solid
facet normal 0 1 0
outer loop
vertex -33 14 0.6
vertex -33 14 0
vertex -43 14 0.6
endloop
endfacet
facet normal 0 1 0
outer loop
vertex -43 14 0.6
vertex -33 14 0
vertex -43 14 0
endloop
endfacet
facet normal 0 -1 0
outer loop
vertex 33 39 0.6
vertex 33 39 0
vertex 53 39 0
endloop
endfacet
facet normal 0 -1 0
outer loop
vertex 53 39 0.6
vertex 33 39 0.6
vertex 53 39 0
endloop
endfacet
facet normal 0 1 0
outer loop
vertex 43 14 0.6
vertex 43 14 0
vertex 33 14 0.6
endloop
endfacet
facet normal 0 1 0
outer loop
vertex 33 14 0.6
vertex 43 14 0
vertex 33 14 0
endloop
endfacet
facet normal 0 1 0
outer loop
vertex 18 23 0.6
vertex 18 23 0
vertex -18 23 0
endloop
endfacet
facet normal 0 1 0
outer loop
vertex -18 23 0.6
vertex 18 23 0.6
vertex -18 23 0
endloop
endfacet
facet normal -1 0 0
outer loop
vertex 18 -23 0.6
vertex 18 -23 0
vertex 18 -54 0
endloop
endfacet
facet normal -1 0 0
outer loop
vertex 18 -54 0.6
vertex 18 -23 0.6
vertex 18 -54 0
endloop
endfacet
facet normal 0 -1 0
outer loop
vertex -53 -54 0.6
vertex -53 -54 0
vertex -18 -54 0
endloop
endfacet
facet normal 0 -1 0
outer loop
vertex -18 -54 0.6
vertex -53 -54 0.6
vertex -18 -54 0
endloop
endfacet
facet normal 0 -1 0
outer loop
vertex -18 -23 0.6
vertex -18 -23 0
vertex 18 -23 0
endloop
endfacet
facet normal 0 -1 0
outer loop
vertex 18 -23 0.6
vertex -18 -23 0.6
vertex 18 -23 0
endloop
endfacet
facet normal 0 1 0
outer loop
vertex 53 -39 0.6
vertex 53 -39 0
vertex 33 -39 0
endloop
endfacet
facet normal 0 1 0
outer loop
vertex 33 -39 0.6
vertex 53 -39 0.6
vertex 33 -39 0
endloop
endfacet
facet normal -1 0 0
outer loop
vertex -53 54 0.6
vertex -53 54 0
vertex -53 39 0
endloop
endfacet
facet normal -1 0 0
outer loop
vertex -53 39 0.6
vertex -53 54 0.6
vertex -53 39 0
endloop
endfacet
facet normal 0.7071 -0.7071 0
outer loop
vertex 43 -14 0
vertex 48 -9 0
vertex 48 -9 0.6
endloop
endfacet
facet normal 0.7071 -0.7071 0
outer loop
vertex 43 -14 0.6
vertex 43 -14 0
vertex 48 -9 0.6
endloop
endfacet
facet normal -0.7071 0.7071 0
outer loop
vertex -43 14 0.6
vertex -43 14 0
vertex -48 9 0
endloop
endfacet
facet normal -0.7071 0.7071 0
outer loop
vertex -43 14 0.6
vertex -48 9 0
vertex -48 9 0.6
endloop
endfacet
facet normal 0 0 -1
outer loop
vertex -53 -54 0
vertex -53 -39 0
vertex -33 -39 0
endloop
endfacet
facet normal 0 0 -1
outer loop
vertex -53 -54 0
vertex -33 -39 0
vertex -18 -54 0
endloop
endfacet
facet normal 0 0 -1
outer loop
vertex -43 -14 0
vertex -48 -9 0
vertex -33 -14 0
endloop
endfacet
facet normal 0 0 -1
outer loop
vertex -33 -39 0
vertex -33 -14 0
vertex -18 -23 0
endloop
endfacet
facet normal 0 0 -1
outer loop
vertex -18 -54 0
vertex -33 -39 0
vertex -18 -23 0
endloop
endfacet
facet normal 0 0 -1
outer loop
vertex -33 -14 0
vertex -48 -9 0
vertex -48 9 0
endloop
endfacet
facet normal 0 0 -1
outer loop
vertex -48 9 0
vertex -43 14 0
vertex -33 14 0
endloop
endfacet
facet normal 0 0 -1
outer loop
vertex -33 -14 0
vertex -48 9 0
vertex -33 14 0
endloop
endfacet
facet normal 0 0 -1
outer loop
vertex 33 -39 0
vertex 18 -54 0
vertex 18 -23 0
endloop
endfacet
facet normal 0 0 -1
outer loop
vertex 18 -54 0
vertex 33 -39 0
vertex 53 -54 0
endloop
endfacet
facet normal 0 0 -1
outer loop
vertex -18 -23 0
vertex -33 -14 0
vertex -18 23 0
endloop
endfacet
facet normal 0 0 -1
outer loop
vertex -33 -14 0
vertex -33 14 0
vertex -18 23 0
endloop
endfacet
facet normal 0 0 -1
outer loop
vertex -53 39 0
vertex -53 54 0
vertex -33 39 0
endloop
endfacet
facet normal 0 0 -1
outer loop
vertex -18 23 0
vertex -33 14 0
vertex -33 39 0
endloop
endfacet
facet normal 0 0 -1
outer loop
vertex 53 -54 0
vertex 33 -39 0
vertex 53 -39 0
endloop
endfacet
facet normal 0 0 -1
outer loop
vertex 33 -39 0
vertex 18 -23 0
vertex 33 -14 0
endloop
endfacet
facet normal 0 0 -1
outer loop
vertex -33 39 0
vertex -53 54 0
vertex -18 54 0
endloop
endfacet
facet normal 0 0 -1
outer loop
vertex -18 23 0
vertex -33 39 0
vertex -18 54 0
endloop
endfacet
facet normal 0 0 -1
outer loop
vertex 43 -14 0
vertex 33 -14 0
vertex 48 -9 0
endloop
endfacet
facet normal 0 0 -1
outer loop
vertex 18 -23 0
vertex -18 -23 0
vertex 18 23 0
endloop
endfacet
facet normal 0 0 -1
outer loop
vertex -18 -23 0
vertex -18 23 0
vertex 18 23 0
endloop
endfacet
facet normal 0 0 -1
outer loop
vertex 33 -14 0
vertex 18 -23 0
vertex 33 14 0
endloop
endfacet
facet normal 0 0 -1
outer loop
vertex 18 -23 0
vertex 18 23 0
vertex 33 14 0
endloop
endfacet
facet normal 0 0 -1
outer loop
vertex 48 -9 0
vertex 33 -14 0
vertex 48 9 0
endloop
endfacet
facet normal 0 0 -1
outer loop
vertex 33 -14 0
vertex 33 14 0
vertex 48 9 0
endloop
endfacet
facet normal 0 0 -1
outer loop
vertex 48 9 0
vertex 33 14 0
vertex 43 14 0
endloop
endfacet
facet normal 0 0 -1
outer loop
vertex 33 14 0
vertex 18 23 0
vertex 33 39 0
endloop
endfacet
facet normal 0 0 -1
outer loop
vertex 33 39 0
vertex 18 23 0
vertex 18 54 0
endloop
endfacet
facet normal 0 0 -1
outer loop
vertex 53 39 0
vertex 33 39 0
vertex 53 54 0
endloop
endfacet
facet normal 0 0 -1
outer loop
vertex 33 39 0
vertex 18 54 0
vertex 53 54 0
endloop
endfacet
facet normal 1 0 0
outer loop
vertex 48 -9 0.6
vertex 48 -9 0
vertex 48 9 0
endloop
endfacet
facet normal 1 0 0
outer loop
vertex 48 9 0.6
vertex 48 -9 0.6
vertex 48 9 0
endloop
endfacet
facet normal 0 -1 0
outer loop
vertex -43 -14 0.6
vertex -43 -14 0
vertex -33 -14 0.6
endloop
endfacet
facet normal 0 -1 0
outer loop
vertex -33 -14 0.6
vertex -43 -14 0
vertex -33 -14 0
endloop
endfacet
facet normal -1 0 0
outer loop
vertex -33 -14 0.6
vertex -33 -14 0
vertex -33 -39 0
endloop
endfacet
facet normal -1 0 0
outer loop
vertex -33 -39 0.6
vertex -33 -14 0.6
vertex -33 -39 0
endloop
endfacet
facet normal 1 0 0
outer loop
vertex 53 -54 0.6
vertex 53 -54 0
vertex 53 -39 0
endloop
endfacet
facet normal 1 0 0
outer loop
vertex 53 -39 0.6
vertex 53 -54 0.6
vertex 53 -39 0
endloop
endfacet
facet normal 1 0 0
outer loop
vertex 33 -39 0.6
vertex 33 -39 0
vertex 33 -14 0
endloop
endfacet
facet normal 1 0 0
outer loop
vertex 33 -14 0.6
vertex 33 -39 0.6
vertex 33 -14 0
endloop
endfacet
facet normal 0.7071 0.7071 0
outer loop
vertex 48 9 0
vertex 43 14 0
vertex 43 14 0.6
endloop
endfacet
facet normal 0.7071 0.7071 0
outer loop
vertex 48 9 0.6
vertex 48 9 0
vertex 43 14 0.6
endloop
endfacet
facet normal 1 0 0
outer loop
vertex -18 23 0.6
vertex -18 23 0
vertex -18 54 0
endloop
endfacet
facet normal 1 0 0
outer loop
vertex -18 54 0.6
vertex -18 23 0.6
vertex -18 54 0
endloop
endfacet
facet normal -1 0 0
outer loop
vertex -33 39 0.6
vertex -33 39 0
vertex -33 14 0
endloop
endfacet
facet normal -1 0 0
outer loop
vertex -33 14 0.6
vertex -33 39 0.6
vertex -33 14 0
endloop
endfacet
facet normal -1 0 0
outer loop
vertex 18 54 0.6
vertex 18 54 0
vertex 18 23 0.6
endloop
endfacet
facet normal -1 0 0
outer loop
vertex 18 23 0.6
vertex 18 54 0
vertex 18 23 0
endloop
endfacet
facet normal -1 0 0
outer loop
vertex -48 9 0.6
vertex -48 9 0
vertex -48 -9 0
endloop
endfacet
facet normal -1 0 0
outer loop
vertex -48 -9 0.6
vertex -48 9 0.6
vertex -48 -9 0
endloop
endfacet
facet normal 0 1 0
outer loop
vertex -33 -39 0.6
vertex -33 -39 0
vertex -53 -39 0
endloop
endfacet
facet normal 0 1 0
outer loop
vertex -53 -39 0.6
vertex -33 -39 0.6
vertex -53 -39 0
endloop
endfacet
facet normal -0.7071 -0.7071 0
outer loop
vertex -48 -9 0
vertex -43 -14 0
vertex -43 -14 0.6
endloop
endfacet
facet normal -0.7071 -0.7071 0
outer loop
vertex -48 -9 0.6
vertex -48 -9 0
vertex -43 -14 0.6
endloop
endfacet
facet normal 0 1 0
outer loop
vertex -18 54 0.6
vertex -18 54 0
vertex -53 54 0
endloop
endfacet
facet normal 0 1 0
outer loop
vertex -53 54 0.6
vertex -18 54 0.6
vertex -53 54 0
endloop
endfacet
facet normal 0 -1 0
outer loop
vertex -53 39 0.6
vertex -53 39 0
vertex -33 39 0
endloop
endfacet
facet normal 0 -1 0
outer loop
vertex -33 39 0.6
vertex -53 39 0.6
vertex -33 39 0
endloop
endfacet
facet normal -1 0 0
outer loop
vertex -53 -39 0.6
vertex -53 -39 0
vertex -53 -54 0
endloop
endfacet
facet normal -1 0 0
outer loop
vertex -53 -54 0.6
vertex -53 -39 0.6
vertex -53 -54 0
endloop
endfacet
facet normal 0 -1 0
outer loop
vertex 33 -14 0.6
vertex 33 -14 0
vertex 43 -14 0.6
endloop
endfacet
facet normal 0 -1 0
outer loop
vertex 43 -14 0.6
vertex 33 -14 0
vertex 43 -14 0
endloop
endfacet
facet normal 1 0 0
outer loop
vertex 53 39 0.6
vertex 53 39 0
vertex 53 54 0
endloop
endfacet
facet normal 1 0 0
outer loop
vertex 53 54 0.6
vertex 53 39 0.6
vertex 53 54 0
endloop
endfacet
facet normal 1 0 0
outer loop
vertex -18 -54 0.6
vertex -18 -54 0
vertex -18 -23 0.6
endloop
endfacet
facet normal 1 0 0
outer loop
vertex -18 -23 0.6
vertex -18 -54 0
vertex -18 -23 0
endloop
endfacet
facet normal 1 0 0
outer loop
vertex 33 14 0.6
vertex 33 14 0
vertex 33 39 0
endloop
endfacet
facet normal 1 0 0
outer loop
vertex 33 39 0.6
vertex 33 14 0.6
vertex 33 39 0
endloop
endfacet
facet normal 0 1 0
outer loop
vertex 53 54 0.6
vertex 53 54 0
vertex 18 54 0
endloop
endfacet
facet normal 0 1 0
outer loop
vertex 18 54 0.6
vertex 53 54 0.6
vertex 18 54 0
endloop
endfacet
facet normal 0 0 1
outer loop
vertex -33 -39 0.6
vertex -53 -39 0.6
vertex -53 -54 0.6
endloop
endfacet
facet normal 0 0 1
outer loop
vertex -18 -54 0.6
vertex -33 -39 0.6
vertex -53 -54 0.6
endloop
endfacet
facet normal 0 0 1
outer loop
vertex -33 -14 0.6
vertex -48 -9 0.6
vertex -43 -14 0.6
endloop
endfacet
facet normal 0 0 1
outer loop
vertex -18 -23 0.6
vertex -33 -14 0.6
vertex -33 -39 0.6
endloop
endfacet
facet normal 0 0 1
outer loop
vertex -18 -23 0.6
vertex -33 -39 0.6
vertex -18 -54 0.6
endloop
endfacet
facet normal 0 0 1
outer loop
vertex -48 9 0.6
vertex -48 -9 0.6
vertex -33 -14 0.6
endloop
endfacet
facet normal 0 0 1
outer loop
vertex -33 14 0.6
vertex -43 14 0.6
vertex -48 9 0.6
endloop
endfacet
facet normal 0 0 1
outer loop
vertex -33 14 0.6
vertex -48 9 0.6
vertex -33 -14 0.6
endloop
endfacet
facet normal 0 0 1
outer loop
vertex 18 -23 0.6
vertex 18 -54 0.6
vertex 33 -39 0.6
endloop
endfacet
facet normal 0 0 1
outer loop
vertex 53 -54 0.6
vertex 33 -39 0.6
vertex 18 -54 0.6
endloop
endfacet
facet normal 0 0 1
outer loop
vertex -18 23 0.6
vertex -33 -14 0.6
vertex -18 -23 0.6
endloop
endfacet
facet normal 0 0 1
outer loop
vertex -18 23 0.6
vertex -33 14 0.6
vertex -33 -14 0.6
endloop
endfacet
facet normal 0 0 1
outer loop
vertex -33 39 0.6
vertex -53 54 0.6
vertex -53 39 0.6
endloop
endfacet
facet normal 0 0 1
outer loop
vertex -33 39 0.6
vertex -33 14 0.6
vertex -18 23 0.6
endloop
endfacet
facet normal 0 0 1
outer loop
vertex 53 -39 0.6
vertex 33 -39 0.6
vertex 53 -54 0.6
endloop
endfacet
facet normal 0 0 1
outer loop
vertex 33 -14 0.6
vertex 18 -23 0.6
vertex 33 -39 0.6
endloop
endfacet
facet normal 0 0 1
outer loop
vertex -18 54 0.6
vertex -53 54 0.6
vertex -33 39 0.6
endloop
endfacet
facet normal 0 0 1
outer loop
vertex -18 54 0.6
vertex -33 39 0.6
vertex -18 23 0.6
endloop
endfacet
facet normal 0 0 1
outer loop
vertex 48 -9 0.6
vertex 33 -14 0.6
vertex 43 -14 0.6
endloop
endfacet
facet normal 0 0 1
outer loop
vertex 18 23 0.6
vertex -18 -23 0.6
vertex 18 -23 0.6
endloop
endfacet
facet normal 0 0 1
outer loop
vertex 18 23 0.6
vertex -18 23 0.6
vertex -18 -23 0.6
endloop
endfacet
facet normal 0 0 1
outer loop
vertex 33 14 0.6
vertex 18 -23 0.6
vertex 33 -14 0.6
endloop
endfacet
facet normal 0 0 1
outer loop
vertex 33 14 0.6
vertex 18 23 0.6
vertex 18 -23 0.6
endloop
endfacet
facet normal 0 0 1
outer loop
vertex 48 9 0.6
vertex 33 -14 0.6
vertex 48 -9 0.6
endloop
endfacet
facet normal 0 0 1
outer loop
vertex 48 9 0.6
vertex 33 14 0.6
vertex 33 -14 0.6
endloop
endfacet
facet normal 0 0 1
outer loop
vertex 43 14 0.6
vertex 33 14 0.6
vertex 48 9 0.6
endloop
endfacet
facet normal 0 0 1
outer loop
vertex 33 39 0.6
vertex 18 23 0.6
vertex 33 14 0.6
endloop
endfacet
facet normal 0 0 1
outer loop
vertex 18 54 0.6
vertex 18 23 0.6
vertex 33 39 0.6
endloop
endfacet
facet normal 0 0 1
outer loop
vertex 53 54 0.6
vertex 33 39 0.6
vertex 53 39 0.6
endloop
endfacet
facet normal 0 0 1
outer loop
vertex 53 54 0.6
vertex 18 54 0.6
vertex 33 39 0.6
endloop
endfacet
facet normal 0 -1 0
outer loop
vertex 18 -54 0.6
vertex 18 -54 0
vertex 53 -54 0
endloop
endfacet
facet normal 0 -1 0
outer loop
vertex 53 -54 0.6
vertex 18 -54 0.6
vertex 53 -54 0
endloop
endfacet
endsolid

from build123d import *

# Parameters (mm, degrees)
F1_DEPTH = 0.6
F2_SIZE  = 5


with BuildPart() as f1:
    # F0 (on Top) → F1 (new body)
    with BuildSketch(Plane.XY):
        Polygon((-48, 14), (-48, 0), (-48, -14), (-33, -14), (-33, -39), (-53, -39), (-53, -54), (-18, -54), (-18, -23), (0, -23), (18, -23), (18, -54), (53, -54), (53, -39), (33, -39), (33, -14), (48, -14), (48, 0), (48, 14), (33, 14), (33, 39), (53, 39), (53, 54), (18, 54), (18, 23), (-18, 23), (-18, 54), (-53, 54), (-53, 39), (-33, 39), (-33, 14), align=None)
    extrude(amount=F1_DEPTH)

    # F2
    f2_edges = [f1.edges().sort_by_distance(p)[0] for p in [
        (-48, 14, 0.3),
        (-48, -14, 0.3),
        (48, 14, 0.3),
        (48, -14, 0.3),
    ]]
    chamfer(f2_edges, length=F2_SIZE)


solid = f1.part
